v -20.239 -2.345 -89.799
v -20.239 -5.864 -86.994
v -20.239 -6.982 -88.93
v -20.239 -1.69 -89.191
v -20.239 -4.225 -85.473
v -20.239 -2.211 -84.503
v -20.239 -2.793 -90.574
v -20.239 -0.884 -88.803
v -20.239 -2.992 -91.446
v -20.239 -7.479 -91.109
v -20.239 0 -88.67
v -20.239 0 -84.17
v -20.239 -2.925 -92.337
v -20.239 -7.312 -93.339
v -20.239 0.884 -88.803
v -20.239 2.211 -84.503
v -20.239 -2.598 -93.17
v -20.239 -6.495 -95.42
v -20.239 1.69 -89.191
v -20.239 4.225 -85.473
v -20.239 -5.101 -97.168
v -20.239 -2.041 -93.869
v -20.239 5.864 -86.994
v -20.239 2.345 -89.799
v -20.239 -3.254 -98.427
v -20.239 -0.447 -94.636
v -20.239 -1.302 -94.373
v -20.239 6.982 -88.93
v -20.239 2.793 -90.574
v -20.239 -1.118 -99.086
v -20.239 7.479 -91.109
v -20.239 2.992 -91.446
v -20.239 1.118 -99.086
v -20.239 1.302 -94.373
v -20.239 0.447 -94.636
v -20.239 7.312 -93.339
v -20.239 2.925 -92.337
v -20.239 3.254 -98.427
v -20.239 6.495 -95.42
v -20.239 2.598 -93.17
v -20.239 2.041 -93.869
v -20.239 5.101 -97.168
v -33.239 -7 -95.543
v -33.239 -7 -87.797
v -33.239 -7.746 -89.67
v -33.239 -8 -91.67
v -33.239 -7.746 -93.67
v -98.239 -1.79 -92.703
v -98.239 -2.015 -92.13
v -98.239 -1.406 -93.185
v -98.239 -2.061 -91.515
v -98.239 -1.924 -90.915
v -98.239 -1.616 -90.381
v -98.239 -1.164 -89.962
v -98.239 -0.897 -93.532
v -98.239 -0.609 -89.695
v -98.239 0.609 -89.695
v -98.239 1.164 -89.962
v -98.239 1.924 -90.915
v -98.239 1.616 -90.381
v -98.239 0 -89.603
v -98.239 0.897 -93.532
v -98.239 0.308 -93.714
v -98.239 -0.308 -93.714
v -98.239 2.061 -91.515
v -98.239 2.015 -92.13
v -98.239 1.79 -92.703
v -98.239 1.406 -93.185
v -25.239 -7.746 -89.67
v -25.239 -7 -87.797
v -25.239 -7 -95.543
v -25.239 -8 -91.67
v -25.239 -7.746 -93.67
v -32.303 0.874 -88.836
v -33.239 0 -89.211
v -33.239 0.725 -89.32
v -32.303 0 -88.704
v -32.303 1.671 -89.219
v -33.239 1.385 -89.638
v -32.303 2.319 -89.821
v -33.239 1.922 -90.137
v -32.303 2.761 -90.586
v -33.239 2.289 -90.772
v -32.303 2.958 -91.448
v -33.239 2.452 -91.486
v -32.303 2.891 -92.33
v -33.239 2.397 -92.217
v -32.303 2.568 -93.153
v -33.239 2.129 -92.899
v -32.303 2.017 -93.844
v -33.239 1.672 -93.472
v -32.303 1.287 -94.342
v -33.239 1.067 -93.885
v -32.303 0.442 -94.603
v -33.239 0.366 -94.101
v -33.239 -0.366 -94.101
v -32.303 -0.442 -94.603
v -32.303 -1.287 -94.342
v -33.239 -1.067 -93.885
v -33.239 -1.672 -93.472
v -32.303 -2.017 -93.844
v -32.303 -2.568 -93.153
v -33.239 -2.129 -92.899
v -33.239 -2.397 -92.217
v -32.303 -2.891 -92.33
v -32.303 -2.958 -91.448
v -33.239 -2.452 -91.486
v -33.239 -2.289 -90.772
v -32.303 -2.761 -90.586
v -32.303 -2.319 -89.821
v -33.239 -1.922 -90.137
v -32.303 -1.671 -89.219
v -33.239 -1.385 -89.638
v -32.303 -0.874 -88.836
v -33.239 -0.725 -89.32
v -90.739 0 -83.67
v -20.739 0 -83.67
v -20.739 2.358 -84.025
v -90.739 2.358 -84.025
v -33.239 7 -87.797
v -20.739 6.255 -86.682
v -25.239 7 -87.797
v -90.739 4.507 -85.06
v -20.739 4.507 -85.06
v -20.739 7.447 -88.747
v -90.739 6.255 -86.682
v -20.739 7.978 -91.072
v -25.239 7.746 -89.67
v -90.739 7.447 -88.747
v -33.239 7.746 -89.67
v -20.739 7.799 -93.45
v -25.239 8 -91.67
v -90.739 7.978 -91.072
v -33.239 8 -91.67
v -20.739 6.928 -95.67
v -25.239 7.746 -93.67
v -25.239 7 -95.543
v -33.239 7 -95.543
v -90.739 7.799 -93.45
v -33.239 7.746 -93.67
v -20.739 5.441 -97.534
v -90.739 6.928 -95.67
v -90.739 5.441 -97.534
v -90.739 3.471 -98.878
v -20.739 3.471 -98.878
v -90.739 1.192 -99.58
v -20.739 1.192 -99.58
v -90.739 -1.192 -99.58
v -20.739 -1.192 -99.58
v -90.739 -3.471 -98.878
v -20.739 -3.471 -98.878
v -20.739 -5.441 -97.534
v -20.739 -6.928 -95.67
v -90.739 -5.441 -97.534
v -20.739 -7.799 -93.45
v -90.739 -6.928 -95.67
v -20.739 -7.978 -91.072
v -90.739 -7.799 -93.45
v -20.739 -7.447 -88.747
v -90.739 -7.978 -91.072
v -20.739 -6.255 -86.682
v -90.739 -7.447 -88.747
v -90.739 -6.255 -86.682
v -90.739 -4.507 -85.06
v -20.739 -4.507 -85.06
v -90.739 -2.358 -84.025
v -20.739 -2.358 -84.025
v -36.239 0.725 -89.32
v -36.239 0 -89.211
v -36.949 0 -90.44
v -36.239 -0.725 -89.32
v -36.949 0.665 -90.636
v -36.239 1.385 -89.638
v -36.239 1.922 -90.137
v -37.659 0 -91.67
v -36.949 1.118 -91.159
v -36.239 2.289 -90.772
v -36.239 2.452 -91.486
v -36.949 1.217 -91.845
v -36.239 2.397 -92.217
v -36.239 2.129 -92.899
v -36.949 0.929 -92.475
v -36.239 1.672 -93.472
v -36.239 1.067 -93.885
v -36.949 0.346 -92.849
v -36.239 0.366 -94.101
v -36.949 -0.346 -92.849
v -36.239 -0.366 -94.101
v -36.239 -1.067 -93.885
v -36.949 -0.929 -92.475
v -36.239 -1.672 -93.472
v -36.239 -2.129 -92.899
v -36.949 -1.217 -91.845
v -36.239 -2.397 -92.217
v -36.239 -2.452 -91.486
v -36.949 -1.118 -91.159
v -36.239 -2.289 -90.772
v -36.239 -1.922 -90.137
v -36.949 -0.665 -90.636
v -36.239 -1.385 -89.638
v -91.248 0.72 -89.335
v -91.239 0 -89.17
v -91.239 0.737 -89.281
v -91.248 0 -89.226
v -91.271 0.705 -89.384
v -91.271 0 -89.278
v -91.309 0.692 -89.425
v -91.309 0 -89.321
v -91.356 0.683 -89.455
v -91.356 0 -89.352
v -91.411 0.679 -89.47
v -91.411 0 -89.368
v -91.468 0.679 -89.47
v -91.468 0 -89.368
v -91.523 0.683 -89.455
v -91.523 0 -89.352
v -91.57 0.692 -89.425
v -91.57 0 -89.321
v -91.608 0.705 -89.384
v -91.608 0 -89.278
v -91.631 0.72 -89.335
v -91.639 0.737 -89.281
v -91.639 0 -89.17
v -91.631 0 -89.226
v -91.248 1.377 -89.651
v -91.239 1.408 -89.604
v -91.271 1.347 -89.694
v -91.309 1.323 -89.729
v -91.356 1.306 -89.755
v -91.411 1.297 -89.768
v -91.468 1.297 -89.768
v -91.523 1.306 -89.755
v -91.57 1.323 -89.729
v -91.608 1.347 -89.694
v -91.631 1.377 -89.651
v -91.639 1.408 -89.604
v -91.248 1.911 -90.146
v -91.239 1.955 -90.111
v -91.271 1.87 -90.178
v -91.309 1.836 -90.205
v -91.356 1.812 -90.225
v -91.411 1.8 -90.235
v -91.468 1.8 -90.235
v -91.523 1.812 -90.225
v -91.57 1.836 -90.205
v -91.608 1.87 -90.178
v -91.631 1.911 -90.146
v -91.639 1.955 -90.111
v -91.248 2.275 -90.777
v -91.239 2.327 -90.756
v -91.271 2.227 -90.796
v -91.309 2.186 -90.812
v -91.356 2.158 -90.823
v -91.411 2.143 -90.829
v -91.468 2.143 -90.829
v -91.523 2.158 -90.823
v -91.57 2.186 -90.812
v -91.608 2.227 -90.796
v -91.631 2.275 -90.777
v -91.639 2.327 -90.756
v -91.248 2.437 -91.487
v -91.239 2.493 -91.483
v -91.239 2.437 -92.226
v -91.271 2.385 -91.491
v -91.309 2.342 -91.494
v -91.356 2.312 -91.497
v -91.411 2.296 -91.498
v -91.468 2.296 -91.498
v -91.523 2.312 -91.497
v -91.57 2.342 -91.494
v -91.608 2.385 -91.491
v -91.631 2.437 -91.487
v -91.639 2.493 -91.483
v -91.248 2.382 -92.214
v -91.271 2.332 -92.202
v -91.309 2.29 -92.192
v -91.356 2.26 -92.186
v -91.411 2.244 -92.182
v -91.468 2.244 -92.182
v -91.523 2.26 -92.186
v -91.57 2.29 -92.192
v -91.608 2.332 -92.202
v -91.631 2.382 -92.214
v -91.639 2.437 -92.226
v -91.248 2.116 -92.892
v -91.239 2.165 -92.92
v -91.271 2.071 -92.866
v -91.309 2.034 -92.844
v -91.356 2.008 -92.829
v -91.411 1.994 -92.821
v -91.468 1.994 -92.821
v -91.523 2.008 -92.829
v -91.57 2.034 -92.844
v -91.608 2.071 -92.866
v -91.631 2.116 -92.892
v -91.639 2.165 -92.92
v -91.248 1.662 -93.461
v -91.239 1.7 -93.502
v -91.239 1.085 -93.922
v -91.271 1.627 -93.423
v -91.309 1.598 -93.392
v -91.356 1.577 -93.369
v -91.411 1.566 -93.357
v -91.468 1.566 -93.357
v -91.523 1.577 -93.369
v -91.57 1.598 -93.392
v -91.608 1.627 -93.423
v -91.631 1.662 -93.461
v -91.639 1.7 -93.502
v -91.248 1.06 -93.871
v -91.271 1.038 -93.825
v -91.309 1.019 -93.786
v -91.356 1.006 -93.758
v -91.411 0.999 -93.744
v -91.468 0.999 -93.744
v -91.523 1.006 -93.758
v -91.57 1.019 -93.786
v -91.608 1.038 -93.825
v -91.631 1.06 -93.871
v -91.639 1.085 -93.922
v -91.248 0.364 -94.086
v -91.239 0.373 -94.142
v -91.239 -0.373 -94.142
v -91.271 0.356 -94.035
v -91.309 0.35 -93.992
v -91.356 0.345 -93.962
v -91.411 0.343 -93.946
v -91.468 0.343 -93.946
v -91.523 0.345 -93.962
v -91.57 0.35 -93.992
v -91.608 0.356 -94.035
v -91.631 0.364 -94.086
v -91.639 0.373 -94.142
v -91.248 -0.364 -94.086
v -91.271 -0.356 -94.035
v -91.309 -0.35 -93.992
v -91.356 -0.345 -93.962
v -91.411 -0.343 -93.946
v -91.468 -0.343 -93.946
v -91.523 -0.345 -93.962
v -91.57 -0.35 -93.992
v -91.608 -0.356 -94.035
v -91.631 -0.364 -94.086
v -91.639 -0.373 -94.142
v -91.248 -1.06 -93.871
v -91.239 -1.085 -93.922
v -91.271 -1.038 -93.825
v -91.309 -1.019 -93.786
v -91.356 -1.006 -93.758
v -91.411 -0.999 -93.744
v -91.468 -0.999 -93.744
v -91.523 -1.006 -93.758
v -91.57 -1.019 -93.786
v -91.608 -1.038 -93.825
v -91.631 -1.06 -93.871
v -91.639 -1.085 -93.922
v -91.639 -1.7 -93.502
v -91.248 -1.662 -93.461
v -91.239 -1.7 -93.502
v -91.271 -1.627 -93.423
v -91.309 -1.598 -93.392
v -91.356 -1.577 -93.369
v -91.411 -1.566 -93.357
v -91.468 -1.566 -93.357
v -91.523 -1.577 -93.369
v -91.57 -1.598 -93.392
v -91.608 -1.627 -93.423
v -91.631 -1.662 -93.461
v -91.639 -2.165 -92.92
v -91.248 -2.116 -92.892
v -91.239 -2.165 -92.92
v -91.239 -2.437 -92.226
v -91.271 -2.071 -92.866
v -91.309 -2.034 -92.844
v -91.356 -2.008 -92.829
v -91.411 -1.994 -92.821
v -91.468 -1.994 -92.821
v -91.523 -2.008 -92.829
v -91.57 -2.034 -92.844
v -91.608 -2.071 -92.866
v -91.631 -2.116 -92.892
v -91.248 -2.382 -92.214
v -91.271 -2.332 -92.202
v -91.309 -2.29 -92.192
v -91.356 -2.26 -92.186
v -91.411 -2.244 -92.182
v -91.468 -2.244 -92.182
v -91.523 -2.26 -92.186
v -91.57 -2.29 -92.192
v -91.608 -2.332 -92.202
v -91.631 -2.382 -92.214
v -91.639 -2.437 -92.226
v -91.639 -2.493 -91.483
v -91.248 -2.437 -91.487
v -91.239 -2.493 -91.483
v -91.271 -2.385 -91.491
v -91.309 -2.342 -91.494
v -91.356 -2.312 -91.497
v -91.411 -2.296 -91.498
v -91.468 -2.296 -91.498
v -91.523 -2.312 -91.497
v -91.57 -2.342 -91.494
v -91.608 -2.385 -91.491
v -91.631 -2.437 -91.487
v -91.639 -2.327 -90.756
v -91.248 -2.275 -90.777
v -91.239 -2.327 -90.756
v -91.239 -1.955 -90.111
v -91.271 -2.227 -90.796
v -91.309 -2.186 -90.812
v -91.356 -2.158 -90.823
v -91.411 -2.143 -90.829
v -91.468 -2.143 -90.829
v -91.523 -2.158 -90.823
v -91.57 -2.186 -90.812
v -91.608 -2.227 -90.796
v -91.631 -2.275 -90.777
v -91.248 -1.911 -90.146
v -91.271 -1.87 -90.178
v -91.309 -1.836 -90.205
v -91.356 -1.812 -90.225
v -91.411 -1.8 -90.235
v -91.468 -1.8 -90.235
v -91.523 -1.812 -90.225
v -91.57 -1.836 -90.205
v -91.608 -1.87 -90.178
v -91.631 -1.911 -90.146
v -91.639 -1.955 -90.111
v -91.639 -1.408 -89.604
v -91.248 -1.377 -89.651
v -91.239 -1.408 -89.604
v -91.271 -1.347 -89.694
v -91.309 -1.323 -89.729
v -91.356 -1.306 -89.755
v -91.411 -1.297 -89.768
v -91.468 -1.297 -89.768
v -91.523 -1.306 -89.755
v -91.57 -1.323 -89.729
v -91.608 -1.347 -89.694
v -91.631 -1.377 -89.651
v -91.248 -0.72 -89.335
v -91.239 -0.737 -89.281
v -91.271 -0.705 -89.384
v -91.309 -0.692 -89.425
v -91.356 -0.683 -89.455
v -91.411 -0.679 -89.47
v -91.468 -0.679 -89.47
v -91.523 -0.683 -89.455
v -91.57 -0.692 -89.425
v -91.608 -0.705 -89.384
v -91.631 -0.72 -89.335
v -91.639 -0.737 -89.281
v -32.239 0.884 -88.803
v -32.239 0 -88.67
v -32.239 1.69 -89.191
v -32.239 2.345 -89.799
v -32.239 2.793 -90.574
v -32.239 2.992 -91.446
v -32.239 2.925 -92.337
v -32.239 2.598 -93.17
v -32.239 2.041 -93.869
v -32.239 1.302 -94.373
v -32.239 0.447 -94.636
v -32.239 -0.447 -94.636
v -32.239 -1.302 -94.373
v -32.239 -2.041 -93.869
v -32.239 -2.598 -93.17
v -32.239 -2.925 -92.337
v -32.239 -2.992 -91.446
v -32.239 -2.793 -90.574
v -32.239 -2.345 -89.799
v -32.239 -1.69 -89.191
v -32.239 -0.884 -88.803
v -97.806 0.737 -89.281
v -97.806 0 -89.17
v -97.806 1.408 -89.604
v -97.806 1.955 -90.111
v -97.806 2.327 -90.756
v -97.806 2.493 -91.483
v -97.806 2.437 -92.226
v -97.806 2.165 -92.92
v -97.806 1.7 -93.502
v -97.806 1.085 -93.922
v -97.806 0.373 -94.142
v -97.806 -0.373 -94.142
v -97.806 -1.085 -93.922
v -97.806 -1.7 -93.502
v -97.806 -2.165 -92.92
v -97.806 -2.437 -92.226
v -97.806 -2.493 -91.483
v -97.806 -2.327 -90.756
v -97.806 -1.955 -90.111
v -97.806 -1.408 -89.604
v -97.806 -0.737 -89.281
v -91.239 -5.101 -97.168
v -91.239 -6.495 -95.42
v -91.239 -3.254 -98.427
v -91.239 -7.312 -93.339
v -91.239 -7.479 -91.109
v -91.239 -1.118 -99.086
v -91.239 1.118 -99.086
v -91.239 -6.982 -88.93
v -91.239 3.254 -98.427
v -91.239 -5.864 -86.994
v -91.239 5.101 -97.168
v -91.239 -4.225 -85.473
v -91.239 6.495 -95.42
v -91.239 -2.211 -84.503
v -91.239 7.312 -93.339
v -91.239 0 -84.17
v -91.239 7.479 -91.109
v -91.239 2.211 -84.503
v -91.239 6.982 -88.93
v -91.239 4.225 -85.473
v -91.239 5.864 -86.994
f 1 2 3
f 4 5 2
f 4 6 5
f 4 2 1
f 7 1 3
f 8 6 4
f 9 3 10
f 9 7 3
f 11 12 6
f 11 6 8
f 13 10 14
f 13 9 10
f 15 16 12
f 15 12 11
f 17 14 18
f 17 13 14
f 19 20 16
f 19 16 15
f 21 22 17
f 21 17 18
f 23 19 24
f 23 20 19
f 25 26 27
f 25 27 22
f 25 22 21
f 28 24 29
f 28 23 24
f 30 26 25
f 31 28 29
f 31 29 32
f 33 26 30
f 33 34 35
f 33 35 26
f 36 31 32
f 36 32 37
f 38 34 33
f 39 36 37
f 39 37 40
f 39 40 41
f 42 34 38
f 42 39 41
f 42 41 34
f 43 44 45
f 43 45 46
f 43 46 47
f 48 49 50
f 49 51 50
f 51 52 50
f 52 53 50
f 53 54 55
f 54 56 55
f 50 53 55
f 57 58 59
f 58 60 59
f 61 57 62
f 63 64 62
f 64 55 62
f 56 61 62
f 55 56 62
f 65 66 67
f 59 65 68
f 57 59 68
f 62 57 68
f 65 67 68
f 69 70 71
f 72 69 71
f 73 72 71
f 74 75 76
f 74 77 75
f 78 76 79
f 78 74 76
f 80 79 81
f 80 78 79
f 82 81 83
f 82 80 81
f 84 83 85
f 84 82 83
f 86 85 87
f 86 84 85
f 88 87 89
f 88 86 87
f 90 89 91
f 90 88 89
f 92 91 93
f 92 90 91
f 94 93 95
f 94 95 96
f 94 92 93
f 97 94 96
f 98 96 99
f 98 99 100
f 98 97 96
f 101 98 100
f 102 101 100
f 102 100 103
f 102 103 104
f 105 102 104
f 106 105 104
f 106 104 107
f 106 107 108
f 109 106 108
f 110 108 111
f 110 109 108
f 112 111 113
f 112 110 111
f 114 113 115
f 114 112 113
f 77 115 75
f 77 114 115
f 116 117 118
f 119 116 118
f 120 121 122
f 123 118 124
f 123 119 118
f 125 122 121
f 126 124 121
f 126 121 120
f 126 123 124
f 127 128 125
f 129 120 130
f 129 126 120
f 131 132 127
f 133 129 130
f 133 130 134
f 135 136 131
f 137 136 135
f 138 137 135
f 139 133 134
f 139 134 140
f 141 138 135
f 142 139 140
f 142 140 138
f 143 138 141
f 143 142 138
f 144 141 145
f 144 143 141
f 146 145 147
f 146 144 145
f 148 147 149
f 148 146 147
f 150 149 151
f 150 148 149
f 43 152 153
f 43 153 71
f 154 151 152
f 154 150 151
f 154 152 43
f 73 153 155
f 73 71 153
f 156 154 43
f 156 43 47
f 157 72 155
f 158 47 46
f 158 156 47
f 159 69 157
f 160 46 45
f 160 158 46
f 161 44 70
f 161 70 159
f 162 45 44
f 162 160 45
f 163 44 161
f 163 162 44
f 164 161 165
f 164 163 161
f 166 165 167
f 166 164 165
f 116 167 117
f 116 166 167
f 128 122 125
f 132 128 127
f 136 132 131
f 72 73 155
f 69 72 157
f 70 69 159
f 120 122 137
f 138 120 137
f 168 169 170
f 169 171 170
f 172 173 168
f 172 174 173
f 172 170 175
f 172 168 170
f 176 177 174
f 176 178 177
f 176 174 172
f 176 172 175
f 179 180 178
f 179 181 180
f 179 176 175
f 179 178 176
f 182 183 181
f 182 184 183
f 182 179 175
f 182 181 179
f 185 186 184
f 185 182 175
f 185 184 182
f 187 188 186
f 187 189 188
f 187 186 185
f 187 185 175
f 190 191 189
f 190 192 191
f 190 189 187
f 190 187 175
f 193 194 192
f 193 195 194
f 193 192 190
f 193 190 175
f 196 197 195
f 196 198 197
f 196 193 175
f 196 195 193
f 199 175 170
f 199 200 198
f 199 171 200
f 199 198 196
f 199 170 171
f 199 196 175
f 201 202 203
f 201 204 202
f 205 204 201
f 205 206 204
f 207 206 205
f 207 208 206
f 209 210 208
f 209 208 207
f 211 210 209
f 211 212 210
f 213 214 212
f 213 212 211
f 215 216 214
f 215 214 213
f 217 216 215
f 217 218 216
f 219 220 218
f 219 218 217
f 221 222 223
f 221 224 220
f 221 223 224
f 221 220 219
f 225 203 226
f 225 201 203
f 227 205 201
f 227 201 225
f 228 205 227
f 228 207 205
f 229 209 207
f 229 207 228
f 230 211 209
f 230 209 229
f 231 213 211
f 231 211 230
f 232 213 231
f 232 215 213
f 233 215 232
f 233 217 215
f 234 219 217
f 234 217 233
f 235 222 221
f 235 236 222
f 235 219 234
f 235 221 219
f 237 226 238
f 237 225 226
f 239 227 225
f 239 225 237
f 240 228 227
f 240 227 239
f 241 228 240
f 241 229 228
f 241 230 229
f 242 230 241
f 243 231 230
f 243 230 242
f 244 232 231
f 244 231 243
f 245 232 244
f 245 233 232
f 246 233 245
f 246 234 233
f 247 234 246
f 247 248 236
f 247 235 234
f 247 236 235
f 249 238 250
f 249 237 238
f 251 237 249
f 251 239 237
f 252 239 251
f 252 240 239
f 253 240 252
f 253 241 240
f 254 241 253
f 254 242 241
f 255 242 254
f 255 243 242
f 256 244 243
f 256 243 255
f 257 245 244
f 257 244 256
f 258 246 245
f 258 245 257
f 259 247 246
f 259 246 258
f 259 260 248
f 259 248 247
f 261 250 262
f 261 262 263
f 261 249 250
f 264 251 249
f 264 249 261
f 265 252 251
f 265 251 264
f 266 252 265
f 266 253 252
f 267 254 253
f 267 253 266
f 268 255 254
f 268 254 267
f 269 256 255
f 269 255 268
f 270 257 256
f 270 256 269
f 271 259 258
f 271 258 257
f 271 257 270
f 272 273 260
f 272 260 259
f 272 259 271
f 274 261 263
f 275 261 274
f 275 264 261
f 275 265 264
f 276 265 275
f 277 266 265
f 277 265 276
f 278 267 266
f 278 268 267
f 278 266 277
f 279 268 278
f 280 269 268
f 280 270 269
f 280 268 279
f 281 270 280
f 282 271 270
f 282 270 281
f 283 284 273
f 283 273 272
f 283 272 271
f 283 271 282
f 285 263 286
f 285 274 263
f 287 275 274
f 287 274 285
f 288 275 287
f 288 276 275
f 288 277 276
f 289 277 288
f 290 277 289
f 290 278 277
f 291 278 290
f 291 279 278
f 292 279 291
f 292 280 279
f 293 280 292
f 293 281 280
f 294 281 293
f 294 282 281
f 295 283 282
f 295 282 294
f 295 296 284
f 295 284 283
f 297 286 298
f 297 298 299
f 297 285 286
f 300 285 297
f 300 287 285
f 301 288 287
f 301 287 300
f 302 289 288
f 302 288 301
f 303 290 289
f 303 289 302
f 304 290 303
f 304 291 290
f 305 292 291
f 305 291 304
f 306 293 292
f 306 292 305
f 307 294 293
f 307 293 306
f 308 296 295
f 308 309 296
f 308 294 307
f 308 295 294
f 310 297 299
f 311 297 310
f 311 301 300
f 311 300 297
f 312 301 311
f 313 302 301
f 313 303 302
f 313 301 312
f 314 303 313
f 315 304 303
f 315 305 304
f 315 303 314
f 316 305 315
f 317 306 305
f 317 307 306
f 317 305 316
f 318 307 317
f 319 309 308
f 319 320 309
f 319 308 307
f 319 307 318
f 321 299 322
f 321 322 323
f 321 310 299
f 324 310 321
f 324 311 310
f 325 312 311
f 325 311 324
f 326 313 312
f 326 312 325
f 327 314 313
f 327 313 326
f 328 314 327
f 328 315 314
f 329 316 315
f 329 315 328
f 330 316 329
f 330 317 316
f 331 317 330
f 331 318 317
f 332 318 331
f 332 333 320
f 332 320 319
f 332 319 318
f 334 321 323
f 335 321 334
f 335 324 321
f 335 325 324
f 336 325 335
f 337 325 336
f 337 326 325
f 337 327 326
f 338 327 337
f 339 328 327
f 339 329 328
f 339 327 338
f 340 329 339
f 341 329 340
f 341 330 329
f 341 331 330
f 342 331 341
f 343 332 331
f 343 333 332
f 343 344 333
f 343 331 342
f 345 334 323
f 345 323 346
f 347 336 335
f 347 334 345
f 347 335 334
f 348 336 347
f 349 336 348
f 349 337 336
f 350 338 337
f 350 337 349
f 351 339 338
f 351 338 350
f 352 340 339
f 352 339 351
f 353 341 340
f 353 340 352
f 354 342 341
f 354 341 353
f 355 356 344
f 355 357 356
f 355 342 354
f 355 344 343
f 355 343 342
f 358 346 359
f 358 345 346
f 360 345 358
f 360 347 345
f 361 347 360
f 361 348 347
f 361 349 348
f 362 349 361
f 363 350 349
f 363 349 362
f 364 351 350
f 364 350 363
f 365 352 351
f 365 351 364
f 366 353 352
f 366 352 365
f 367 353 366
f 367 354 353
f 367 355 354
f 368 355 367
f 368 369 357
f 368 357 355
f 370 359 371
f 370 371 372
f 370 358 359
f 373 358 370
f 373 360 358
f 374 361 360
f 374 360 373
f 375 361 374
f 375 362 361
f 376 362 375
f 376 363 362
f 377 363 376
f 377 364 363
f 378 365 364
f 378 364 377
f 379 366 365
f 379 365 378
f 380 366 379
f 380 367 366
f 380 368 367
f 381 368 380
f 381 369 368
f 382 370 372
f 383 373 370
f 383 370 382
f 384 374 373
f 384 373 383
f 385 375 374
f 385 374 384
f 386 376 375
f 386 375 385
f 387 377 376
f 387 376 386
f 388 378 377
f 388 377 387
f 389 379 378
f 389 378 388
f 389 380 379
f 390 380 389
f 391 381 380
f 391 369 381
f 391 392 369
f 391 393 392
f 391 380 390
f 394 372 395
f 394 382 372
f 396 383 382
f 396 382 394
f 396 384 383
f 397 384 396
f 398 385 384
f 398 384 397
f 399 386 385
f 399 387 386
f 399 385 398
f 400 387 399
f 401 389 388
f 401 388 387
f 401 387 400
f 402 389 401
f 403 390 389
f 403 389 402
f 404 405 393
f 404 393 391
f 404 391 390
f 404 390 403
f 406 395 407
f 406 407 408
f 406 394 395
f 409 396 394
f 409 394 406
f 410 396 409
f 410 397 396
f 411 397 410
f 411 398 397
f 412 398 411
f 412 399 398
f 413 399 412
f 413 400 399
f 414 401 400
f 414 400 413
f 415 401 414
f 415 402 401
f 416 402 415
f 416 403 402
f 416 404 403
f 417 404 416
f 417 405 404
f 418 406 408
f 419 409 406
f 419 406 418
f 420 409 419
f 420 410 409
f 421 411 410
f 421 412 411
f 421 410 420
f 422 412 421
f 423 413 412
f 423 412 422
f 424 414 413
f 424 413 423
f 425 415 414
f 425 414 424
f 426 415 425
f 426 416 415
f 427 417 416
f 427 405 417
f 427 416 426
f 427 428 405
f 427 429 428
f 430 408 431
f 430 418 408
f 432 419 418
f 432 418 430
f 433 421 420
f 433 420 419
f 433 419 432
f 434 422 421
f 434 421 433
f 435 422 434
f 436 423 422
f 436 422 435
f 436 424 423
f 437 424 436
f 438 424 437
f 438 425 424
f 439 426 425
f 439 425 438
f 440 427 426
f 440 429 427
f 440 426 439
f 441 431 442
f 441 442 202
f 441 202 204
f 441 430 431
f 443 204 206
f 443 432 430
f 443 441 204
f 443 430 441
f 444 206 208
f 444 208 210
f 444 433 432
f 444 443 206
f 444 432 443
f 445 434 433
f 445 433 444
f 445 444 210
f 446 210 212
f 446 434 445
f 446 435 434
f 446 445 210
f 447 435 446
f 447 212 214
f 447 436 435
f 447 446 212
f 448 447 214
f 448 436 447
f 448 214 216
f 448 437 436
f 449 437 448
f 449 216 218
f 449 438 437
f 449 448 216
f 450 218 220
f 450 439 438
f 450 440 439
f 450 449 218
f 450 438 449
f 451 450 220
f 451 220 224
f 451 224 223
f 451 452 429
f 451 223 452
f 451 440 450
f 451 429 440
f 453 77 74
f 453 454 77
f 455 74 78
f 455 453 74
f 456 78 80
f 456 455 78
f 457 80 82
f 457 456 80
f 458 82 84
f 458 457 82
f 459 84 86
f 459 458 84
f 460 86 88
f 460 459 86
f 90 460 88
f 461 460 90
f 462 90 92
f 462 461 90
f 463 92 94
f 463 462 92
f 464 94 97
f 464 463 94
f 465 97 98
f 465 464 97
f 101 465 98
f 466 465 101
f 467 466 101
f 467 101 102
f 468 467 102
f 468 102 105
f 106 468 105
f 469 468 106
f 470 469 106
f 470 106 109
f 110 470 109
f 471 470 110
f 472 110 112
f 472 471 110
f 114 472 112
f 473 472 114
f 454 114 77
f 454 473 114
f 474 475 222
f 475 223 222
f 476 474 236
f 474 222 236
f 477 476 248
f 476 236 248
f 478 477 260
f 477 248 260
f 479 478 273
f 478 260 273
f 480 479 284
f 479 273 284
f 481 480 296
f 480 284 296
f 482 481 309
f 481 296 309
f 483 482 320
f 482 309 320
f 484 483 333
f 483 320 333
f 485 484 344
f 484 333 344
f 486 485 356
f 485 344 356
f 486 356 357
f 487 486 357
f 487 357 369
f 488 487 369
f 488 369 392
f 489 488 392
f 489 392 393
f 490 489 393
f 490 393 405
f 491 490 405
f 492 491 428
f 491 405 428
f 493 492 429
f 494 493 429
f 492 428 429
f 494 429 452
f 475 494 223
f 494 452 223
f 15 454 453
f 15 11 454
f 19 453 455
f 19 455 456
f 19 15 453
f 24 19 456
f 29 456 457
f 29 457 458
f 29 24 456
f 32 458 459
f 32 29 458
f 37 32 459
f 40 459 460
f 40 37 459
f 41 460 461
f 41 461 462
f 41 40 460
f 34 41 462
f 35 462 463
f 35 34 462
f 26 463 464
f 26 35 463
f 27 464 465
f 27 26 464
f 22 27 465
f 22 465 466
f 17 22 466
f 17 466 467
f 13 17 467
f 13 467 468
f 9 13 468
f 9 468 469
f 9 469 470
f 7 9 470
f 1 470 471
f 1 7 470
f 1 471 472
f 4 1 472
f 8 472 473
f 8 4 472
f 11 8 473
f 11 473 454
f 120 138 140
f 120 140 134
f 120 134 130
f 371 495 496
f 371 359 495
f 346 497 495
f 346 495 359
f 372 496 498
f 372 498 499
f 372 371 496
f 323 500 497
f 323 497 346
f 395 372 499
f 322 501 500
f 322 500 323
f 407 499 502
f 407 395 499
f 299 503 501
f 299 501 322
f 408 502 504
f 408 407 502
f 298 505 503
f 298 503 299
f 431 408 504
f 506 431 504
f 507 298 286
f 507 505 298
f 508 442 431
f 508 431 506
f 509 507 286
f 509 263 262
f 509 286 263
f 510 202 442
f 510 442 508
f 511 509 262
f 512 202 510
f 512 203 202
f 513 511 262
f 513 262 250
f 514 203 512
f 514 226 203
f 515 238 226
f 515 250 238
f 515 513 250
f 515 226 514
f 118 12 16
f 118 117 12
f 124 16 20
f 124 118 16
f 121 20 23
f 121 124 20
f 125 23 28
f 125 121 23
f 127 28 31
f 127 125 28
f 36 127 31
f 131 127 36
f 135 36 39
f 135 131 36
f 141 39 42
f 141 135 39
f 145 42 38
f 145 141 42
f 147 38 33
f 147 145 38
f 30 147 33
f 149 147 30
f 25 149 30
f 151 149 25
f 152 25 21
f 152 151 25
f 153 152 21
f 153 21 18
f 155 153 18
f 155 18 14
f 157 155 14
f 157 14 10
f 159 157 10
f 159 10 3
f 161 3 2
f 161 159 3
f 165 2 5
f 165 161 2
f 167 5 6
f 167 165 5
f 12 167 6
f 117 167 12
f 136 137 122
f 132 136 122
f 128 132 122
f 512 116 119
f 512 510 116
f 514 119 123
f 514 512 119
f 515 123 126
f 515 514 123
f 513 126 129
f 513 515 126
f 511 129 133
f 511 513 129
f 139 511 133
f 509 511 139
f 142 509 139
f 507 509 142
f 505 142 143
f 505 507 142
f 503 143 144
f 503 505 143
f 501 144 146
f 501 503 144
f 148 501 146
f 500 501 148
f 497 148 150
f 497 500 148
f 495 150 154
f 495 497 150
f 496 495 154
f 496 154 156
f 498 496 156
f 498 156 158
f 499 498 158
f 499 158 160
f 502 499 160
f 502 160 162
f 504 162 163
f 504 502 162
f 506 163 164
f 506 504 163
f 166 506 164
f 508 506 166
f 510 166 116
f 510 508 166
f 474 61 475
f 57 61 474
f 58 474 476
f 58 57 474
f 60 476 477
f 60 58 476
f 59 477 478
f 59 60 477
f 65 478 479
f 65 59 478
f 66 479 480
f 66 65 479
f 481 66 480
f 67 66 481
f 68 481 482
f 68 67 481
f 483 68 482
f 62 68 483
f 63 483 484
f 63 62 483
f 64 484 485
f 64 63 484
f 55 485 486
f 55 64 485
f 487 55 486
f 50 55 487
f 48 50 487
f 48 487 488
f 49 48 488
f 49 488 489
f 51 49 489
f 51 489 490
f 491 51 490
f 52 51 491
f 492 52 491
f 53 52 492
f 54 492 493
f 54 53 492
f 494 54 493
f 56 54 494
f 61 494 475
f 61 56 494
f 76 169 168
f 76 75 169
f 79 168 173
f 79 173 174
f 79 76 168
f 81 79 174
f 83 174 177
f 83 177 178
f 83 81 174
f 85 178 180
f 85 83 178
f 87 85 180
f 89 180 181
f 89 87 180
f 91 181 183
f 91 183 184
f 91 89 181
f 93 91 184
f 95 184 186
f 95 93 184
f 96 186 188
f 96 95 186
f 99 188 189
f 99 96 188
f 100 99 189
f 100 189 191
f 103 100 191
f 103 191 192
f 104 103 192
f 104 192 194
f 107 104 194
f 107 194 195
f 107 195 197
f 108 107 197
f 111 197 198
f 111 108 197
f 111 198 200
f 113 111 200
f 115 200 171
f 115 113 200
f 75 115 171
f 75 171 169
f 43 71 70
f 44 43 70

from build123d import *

# Parameters (mm, degrees)
F0_W     = 0.4
F0_H     = 2.066987
F0_W_2   = 6.166988
F0_H_2   = 0.433013
F0_W_3   = 0.433012
F4_DEPTH = 8


with BuildPart() as f1:
    # F0 (on Front) → F1 (revolve)
    with BuildSketch(Plane.XZ):
        Polygon((-25.239477, -88.669804), (-20.739477, -88.669804), (-20.739477, -83.669804), (-90.739477, -83.669804), (-90.739477, -91.669804), (-37.659028, -91.669804), (-36.239477, -89.21107), (-33.239477, -89.21107), (-33.239477, -87.796821), (-25.239477, -87.796821), align=None)
        Polygon((-26.1410899297, -88.669804), (-25.239477, -88.669804), (-25.239477, -87.796821), align=None)
        Polygon((-32.239477, -88.669804), (-26.1410899297, -88.669804), (-25.239477, -87.796821), (-33.239477, -87.796821), (-32.3025853972, -88.7039624297), align=None)
        Polygon((-33.239477, -87.796821), (-33.239477, -89.21107), (-32.3025853972, -88.7039624297), align=None)
        Polygon((-20.739477, -88.669804), (-20.239477, -88.669804), (-20.239477, -84.169804), (-20.739477, -83.669804), align=None)
        Polygon((-90.739477, -91.669804), (-90.739477, -83.669804), (-91.239477, -84.169804), (-91.239477, -87.049804), (-91.239477, -89.169804), (-91.239477, -89.602817), (-91.239477, -91.669804), align=None)
        with Locations((-91.439477, -90.6363105)):
            Rectangle(F0_W, F0_H)
        with BuildLine():
            Line((-91.639477, -89.602817), (-91.239477, -89.602817))
            Line((-91.239477, -89.602817), (-91.239477, -89.169804))
            ThreePointArc((-91.239477, -89.169804), (-91.439477, -89.369804), (-91.639477, -89.169804))
            Line((-91.639477, -89.169804), (-91.639477, -89.602817))
        make_face()
        with Locations((-94.722971, -89.3863105)):
            Rectangle(F0_W_2, F0_H_2)
        with Locations((-94.722971, -90.6363105)):
            Rectangle(F0_W_2, F0_H)
        with Locations((-98.022971, -90.6363105)):
            Rectangle(F0_W_3, F0_H)
        Polygon((-98.239477, -89.602817), (-97.806465, -89.602817), (-97.806465, -89.169804), align=None)
    revolve(axis=Axis((-57.779478, 0, -91.669804), (-1, 0, 0)))

    # F3 (on offset) → F4 (cut)
    with BuildSketch(Plane.YZ.offset(-33.239477)):
        Polygon((-7, -105.1077917218), (-7, -81.2891572714), (-14.8517033085, -81.2891572714), (-15.7914049923, -106.496937573), align=None)
        Polygon((14.2944240943, -81.2891572714), (7, -81.2891572714), (7, -105.1077917218), (14.2944240943, -107.9208105803), align=None)
    extrude(amount=F4_DEPTH, mode=Mode.SUBTRACT)


solid = f1.part
